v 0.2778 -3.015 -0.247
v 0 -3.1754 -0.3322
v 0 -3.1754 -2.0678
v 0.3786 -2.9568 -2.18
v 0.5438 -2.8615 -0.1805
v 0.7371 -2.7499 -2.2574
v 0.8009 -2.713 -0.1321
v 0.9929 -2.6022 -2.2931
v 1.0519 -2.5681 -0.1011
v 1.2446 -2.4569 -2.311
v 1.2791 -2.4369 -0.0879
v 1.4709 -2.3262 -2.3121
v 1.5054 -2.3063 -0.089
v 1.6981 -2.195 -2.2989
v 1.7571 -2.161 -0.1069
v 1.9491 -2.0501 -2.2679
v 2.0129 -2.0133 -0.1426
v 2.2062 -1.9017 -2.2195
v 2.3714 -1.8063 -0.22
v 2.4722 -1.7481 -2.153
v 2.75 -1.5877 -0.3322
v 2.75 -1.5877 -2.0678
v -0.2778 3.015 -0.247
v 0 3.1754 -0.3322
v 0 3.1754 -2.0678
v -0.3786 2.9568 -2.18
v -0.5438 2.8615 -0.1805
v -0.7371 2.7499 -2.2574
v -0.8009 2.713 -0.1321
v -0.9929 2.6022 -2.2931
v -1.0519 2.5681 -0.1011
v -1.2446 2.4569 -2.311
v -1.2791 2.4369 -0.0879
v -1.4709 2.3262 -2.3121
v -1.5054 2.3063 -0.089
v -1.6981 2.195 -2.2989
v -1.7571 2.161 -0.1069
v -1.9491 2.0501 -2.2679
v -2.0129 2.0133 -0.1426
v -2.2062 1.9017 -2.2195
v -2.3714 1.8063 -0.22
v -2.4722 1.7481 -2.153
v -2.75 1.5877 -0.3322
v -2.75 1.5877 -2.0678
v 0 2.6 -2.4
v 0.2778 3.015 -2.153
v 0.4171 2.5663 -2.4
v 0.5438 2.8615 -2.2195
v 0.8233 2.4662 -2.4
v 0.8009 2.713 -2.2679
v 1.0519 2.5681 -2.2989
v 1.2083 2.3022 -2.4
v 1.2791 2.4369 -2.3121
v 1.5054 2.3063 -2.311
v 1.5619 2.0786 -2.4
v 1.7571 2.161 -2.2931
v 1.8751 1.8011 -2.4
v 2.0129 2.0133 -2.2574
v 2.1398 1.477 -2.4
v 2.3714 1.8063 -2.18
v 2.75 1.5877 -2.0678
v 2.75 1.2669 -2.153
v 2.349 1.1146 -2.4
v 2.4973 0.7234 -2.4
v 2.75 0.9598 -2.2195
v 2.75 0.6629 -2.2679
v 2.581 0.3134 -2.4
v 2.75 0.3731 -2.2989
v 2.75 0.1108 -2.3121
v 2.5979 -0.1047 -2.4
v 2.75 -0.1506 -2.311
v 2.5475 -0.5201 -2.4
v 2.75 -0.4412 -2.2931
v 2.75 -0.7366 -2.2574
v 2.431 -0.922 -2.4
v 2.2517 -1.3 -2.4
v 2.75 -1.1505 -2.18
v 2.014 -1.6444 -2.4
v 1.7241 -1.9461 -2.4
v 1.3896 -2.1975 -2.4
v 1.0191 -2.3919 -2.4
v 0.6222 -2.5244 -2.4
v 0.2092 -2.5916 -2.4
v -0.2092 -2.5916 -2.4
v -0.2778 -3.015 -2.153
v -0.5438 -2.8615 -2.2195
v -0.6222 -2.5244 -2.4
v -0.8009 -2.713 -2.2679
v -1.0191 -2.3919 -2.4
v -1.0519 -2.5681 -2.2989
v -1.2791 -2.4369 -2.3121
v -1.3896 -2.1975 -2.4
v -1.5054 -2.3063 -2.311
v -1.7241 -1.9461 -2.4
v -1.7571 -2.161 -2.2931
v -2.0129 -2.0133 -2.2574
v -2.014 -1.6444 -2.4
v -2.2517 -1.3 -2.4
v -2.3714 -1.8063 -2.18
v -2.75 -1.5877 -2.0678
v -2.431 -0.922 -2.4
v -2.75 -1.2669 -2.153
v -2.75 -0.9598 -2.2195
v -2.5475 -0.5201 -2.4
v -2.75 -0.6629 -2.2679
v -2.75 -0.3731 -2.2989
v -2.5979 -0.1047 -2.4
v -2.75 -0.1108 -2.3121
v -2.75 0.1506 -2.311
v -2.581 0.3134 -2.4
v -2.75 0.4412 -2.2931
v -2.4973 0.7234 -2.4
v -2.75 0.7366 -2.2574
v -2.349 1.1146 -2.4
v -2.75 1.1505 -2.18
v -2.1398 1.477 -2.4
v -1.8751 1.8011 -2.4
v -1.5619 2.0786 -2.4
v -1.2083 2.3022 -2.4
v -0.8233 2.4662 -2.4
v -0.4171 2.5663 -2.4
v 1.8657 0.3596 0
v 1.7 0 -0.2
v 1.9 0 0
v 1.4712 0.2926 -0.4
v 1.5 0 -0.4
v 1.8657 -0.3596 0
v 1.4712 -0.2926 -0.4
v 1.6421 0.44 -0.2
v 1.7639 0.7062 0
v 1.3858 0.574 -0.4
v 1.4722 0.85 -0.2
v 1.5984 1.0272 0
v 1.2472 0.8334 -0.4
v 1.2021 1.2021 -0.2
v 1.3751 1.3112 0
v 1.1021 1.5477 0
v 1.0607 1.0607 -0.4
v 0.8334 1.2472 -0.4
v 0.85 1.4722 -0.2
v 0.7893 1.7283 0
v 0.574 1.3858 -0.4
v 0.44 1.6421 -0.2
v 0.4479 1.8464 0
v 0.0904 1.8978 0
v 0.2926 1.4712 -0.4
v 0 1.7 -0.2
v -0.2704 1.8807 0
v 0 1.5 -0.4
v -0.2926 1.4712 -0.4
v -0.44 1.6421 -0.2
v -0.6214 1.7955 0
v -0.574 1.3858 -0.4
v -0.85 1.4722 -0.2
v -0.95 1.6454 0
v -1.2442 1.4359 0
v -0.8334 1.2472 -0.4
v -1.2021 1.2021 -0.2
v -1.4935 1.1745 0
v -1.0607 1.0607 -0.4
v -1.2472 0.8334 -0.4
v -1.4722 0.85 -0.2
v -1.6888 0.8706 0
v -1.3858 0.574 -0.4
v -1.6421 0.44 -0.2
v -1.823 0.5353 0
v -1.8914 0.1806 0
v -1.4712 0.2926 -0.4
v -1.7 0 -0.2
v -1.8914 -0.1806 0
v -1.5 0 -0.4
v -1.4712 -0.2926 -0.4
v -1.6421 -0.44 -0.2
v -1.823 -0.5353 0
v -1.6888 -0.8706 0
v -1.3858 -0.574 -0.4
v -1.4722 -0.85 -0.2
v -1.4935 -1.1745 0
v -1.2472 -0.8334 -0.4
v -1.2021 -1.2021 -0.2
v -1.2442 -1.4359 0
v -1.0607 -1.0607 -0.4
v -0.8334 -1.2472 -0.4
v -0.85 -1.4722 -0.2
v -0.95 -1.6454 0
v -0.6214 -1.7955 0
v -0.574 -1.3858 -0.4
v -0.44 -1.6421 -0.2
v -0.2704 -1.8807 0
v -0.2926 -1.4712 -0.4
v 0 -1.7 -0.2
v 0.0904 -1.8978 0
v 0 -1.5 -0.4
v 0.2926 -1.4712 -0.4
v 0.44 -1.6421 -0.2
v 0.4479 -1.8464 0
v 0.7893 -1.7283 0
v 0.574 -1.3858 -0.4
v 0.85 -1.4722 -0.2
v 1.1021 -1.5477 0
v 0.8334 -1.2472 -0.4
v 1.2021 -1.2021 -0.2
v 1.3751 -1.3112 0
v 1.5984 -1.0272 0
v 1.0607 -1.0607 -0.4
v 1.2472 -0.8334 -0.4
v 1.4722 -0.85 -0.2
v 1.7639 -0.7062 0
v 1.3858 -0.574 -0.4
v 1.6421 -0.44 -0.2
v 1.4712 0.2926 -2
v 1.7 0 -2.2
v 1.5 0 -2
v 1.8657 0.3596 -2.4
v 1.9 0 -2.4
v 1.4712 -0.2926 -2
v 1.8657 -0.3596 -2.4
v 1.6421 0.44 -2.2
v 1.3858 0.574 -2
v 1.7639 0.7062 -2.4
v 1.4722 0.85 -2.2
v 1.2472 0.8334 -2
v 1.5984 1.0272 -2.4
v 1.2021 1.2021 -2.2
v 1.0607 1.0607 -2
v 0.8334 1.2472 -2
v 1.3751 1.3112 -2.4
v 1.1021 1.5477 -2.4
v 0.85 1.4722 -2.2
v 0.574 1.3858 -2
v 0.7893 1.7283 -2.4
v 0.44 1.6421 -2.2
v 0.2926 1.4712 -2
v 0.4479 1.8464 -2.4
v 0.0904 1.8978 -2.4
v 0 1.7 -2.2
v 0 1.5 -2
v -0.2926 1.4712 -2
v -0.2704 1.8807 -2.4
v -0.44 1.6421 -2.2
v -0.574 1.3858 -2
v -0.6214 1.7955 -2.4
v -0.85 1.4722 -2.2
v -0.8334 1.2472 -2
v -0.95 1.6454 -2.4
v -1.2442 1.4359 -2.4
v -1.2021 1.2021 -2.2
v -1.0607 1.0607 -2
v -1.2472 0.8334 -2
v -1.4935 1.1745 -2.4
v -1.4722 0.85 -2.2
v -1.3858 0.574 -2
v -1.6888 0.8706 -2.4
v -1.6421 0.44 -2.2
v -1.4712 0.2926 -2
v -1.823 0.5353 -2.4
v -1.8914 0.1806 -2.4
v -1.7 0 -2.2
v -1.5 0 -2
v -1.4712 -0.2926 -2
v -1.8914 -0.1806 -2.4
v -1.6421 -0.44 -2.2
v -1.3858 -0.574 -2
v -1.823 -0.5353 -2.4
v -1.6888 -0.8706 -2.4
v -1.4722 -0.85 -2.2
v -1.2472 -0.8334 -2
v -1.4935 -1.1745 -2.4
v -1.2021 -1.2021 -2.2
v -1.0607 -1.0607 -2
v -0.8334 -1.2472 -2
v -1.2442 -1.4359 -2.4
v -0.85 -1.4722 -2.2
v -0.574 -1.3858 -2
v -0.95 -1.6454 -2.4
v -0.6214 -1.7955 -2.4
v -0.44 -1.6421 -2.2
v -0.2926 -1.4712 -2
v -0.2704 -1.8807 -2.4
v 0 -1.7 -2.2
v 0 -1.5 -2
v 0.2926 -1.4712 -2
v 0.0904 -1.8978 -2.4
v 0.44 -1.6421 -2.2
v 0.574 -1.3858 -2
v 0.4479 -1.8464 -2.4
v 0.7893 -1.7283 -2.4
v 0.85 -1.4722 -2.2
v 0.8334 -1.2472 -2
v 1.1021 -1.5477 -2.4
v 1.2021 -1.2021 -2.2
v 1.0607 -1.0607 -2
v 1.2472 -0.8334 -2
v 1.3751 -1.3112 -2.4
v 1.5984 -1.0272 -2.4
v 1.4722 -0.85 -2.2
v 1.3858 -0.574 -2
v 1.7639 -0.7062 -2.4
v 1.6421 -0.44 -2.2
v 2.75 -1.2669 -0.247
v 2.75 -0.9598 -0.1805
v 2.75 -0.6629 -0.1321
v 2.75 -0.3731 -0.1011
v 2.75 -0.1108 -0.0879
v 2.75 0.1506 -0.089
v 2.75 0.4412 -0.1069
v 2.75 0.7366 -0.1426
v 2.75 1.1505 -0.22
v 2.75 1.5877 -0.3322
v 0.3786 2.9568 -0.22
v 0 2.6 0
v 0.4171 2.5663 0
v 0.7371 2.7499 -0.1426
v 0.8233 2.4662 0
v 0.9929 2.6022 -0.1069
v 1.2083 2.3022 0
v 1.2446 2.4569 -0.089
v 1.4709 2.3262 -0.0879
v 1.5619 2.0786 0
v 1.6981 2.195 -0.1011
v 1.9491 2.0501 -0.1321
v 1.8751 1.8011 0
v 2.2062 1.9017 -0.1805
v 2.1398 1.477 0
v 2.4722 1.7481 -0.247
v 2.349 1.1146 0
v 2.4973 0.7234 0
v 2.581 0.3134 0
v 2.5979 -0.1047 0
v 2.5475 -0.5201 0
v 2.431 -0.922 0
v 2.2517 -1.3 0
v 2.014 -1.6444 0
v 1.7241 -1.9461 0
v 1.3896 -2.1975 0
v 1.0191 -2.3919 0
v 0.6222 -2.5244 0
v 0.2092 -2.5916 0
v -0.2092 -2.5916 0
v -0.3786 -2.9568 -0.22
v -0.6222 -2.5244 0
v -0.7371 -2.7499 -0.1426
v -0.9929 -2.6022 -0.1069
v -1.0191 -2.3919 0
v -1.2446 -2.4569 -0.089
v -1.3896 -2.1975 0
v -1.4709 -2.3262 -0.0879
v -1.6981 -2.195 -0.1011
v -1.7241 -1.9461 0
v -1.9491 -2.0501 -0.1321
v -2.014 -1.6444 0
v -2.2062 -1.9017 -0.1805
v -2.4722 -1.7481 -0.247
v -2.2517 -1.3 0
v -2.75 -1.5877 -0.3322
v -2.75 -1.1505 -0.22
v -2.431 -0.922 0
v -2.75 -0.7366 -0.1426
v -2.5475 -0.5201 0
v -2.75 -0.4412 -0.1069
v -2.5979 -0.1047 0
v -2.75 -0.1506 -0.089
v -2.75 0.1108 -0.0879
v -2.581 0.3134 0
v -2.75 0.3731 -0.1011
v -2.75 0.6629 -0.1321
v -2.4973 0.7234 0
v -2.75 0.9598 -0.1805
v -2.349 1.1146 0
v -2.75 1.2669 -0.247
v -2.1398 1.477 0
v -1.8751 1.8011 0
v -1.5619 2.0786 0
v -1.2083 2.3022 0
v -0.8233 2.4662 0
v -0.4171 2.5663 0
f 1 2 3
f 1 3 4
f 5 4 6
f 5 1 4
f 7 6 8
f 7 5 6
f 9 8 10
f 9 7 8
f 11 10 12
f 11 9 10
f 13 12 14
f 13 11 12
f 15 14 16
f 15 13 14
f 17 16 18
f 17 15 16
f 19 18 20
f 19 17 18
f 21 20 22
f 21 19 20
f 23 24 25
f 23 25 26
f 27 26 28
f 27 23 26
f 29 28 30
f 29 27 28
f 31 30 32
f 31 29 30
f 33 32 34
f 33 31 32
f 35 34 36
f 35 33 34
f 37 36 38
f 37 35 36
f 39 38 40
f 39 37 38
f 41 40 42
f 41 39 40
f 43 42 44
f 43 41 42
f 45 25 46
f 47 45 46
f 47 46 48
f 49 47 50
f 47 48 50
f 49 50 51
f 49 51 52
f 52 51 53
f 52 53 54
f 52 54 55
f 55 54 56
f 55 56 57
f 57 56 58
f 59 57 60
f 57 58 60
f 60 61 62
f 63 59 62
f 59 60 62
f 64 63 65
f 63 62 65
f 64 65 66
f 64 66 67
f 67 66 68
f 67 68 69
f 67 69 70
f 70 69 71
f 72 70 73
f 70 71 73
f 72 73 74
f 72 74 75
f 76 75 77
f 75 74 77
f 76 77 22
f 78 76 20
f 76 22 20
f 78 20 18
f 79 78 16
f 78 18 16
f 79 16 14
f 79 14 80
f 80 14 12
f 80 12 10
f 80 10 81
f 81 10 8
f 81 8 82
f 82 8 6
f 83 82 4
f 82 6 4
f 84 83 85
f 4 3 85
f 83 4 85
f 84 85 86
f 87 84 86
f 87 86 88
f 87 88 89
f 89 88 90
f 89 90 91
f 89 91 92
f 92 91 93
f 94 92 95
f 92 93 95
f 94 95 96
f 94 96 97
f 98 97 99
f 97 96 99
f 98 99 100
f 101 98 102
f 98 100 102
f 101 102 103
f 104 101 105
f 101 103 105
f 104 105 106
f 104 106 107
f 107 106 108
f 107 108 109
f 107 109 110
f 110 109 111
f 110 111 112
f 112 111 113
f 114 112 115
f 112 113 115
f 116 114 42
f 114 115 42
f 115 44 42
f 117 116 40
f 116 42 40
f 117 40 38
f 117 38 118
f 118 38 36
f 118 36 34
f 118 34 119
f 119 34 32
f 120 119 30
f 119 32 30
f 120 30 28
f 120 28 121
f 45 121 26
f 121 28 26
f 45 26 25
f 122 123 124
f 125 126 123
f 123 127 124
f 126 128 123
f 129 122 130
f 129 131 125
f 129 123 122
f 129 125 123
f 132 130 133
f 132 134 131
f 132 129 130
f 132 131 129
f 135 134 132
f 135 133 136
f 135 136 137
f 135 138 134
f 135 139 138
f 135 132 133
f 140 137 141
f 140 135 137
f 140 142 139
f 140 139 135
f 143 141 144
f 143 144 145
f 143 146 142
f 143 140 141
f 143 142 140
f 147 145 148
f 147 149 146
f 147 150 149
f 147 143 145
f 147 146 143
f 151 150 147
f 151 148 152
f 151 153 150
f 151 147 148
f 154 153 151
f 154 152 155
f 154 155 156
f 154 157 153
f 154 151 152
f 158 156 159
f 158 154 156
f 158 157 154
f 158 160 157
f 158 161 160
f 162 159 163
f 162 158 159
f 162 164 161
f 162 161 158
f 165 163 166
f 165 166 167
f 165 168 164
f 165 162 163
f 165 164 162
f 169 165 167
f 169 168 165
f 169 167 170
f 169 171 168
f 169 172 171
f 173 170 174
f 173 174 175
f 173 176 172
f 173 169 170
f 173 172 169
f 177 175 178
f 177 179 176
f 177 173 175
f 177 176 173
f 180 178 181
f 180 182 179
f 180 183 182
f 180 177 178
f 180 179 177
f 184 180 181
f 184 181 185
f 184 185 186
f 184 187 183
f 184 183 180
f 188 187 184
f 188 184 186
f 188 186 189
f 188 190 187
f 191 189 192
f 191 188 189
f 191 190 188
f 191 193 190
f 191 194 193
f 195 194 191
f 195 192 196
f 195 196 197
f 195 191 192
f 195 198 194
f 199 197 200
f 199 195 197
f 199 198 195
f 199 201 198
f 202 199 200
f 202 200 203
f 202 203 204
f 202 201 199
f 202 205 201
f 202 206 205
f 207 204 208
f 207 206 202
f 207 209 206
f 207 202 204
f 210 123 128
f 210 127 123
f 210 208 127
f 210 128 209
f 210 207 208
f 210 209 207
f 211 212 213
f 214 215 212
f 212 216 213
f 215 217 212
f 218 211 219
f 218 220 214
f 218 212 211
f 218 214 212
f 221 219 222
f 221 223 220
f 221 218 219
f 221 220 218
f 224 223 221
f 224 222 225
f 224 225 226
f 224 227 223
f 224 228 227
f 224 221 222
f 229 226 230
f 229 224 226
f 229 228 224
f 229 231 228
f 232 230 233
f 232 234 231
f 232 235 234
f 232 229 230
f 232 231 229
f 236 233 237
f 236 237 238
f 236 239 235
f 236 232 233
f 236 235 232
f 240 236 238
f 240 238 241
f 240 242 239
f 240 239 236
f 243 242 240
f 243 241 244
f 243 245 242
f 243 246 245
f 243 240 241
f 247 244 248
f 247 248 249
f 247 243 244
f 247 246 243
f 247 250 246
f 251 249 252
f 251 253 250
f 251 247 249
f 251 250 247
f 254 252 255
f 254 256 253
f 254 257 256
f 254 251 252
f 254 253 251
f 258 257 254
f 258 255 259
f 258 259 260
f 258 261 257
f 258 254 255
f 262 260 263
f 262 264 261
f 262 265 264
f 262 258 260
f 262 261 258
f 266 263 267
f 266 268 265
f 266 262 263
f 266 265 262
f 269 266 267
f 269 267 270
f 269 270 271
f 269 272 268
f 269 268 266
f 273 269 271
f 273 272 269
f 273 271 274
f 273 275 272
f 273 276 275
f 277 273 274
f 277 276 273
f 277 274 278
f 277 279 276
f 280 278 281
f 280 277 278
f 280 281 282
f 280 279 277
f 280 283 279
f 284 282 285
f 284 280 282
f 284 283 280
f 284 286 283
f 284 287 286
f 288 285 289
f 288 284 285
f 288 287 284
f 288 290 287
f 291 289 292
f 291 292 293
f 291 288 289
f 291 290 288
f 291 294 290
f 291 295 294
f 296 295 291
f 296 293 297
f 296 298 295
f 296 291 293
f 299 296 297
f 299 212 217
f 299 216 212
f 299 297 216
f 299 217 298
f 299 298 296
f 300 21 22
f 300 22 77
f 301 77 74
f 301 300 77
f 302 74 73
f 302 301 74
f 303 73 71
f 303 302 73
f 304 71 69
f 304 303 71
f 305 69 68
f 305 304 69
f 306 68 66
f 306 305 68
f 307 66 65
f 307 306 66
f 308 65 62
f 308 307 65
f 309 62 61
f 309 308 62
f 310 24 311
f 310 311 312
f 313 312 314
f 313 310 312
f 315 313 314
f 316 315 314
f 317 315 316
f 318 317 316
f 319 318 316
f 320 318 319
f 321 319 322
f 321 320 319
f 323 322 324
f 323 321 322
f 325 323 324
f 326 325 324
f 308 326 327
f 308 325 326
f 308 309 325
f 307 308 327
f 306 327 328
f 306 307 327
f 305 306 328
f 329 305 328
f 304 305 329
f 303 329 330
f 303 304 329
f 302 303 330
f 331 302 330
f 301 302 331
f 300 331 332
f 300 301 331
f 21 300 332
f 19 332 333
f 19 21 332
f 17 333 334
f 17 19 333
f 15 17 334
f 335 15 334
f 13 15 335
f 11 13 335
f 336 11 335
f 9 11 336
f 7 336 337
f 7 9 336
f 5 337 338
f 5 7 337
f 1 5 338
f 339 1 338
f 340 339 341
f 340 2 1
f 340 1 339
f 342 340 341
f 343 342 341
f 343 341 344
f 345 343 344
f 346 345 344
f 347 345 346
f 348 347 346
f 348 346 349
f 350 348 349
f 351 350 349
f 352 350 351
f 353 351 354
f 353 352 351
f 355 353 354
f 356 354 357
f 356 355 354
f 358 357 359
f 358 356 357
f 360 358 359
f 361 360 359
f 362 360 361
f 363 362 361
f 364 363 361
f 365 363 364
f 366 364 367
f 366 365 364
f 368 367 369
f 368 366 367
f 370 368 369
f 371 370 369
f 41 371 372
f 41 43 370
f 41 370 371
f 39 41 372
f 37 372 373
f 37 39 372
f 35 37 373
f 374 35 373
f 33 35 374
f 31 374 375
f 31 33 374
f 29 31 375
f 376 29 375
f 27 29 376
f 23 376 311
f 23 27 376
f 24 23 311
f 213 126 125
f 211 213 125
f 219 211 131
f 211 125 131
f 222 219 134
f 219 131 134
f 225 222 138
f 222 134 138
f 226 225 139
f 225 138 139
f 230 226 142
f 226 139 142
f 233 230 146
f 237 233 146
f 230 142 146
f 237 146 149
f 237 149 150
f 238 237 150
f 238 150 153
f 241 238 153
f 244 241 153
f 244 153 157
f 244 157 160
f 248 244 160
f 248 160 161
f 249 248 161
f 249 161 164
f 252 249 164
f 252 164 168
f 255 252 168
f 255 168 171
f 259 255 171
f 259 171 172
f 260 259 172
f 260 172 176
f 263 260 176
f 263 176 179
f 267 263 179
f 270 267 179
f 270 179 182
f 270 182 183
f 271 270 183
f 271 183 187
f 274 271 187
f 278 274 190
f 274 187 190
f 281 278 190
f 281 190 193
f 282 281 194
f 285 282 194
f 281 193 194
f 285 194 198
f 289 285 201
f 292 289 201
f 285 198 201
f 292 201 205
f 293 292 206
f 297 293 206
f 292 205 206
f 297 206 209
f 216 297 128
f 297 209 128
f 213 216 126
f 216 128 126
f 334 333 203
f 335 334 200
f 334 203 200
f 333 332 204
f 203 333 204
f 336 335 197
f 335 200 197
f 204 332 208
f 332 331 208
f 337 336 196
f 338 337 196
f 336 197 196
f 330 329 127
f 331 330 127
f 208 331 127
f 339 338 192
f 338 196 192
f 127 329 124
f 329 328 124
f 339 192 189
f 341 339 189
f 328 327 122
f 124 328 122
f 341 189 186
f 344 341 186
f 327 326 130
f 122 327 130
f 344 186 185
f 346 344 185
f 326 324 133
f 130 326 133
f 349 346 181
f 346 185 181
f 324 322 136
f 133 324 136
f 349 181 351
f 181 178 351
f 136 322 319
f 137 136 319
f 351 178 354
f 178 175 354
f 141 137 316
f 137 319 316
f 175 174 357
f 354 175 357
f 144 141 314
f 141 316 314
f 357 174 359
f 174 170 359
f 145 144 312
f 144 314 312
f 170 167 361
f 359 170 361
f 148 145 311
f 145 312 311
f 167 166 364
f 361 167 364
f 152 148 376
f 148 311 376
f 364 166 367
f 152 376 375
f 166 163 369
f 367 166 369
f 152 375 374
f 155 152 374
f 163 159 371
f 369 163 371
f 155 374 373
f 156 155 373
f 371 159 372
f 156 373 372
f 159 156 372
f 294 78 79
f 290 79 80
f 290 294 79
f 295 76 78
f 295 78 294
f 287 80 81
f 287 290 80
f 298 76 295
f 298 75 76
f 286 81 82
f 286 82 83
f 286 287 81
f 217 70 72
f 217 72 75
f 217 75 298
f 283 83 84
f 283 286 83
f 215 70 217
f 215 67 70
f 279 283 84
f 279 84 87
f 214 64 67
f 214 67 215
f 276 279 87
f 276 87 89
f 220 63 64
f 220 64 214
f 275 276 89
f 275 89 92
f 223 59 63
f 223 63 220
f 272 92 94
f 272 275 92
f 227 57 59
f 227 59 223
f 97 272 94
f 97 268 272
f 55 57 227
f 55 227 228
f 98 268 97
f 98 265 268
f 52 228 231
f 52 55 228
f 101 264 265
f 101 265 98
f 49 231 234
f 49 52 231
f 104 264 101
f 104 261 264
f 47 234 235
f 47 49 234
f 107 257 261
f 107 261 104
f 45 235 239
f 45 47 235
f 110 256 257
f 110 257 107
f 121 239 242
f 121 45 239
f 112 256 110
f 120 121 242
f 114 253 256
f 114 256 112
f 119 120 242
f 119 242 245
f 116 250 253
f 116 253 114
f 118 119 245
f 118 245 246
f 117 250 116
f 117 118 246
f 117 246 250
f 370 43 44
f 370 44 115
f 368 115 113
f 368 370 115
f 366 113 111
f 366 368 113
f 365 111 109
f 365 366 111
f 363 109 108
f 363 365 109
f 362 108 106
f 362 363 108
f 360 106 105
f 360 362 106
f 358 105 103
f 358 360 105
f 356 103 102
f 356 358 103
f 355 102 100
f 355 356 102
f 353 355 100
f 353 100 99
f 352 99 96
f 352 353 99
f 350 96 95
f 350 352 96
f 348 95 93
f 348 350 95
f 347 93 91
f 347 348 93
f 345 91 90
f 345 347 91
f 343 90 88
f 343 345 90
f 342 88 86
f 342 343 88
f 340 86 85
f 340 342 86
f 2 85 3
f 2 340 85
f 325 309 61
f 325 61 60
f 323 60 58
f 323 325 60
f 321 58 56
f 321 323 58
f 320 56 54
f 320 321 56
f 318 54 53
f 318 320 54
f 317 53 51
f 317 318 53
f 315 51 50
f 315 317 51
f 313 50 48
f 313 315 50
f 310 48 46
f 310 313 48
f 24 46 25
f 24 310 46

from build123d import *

# Parameters (mm, degrees)
SKETCH_1_W               = 4
SKETCH_1_H               = 2.4
SKETCH_2_OUTSIDE_W       = 12.314
SKETCH_2_OUTSIDE_H       = 12.314
CUT_EXTRUDE_1_DEPTH      = 2.4
SKETCH_3_R               = 1.5
CUT_EXTRUDE_2_DEPTH      = 1
CUT_EXTRUDE_2_DEPTH_BACK = 3.4
CHAMFER_1_SIZE           = 0.4


with BuildPart() as part:
    # Эскиз1 → Повернуть1 (revolve)
    with BuildSketch(Plane(origin=(0, 0, 0), x_dir=(1, 0, 0), z_dir=(0, 1, 0))):
        with Locations((-2, 1.2)):
            Rectangle(SKETCH_1_W, SKETCH_1_H)
    revolve(axis=Axis((0, 0, 0), (0, 0, -1)))

    # Эскиз2 outside → Вырез-Вытянуть1 (cut)
    with BuildSketch(Plane.XY):
        Rectangle(SKETCH_2_OUTSIDE_W, SKETCH_2_OUTSIDE_H)
        Polygon((2.75, -1.58771324), (2.75, 1.58771324), (0, 3.175426481), (-2.75, 1.58771324), (-2.75, -1.58771324), (0, -3.175426481), align=None, mode=Mode.SUBTRACT)
    extrude(amount=-CUT_EXTRUDE_1_DEPTH, mode=Mode.SUBTRACT)

    # Эскиз3 → Вырез-Вытянуть2 (cut, two sides)
    with BuildSketch(Plane.XY) as cut_extrude_2_sk:
        Circle(SKETCH_3_R)
    extrude(amount=CUT_EXTRUDE_2_DEPTH, mode=Mode.SUBTRACT)
    extrude(cut_extrude_2_sk.sketch, amount=-CUT_EXTRUDE_2_DEPTH_BACK, mode=Mode.SUBTRACT)

    # Эскиз4 → Вырез-Повернуть1 (revolve, cut)
    with BuildSketch(Plane(origin=(0, 0, 0), x_dir=(0, 0, -1), z_dir=(1, 0, 0))):
        Polygon((0, 2.6), (0.332222633, 3.175426481), (0, 3.175426481), align=None)
        Polygon((2.4, 2.6), (2.067777367, 3.175426481), (2.4, 3.175426481), align=None)
    revolve(axis=Axis((0, 0, 0), (0, 0, -1)), mode=Mode.SUBTRACT)

    # Фаска1
    chamfer_1_edges = [part.edges().sort_by_distance(p)[0] for p in [
        (-1.5, 0, -2.4),
        (-1.5, 0, 0),
    ]]
    chamfer(chamfer_1_edges, length=CHAMFER_1_SIZE)


solid = part.part
